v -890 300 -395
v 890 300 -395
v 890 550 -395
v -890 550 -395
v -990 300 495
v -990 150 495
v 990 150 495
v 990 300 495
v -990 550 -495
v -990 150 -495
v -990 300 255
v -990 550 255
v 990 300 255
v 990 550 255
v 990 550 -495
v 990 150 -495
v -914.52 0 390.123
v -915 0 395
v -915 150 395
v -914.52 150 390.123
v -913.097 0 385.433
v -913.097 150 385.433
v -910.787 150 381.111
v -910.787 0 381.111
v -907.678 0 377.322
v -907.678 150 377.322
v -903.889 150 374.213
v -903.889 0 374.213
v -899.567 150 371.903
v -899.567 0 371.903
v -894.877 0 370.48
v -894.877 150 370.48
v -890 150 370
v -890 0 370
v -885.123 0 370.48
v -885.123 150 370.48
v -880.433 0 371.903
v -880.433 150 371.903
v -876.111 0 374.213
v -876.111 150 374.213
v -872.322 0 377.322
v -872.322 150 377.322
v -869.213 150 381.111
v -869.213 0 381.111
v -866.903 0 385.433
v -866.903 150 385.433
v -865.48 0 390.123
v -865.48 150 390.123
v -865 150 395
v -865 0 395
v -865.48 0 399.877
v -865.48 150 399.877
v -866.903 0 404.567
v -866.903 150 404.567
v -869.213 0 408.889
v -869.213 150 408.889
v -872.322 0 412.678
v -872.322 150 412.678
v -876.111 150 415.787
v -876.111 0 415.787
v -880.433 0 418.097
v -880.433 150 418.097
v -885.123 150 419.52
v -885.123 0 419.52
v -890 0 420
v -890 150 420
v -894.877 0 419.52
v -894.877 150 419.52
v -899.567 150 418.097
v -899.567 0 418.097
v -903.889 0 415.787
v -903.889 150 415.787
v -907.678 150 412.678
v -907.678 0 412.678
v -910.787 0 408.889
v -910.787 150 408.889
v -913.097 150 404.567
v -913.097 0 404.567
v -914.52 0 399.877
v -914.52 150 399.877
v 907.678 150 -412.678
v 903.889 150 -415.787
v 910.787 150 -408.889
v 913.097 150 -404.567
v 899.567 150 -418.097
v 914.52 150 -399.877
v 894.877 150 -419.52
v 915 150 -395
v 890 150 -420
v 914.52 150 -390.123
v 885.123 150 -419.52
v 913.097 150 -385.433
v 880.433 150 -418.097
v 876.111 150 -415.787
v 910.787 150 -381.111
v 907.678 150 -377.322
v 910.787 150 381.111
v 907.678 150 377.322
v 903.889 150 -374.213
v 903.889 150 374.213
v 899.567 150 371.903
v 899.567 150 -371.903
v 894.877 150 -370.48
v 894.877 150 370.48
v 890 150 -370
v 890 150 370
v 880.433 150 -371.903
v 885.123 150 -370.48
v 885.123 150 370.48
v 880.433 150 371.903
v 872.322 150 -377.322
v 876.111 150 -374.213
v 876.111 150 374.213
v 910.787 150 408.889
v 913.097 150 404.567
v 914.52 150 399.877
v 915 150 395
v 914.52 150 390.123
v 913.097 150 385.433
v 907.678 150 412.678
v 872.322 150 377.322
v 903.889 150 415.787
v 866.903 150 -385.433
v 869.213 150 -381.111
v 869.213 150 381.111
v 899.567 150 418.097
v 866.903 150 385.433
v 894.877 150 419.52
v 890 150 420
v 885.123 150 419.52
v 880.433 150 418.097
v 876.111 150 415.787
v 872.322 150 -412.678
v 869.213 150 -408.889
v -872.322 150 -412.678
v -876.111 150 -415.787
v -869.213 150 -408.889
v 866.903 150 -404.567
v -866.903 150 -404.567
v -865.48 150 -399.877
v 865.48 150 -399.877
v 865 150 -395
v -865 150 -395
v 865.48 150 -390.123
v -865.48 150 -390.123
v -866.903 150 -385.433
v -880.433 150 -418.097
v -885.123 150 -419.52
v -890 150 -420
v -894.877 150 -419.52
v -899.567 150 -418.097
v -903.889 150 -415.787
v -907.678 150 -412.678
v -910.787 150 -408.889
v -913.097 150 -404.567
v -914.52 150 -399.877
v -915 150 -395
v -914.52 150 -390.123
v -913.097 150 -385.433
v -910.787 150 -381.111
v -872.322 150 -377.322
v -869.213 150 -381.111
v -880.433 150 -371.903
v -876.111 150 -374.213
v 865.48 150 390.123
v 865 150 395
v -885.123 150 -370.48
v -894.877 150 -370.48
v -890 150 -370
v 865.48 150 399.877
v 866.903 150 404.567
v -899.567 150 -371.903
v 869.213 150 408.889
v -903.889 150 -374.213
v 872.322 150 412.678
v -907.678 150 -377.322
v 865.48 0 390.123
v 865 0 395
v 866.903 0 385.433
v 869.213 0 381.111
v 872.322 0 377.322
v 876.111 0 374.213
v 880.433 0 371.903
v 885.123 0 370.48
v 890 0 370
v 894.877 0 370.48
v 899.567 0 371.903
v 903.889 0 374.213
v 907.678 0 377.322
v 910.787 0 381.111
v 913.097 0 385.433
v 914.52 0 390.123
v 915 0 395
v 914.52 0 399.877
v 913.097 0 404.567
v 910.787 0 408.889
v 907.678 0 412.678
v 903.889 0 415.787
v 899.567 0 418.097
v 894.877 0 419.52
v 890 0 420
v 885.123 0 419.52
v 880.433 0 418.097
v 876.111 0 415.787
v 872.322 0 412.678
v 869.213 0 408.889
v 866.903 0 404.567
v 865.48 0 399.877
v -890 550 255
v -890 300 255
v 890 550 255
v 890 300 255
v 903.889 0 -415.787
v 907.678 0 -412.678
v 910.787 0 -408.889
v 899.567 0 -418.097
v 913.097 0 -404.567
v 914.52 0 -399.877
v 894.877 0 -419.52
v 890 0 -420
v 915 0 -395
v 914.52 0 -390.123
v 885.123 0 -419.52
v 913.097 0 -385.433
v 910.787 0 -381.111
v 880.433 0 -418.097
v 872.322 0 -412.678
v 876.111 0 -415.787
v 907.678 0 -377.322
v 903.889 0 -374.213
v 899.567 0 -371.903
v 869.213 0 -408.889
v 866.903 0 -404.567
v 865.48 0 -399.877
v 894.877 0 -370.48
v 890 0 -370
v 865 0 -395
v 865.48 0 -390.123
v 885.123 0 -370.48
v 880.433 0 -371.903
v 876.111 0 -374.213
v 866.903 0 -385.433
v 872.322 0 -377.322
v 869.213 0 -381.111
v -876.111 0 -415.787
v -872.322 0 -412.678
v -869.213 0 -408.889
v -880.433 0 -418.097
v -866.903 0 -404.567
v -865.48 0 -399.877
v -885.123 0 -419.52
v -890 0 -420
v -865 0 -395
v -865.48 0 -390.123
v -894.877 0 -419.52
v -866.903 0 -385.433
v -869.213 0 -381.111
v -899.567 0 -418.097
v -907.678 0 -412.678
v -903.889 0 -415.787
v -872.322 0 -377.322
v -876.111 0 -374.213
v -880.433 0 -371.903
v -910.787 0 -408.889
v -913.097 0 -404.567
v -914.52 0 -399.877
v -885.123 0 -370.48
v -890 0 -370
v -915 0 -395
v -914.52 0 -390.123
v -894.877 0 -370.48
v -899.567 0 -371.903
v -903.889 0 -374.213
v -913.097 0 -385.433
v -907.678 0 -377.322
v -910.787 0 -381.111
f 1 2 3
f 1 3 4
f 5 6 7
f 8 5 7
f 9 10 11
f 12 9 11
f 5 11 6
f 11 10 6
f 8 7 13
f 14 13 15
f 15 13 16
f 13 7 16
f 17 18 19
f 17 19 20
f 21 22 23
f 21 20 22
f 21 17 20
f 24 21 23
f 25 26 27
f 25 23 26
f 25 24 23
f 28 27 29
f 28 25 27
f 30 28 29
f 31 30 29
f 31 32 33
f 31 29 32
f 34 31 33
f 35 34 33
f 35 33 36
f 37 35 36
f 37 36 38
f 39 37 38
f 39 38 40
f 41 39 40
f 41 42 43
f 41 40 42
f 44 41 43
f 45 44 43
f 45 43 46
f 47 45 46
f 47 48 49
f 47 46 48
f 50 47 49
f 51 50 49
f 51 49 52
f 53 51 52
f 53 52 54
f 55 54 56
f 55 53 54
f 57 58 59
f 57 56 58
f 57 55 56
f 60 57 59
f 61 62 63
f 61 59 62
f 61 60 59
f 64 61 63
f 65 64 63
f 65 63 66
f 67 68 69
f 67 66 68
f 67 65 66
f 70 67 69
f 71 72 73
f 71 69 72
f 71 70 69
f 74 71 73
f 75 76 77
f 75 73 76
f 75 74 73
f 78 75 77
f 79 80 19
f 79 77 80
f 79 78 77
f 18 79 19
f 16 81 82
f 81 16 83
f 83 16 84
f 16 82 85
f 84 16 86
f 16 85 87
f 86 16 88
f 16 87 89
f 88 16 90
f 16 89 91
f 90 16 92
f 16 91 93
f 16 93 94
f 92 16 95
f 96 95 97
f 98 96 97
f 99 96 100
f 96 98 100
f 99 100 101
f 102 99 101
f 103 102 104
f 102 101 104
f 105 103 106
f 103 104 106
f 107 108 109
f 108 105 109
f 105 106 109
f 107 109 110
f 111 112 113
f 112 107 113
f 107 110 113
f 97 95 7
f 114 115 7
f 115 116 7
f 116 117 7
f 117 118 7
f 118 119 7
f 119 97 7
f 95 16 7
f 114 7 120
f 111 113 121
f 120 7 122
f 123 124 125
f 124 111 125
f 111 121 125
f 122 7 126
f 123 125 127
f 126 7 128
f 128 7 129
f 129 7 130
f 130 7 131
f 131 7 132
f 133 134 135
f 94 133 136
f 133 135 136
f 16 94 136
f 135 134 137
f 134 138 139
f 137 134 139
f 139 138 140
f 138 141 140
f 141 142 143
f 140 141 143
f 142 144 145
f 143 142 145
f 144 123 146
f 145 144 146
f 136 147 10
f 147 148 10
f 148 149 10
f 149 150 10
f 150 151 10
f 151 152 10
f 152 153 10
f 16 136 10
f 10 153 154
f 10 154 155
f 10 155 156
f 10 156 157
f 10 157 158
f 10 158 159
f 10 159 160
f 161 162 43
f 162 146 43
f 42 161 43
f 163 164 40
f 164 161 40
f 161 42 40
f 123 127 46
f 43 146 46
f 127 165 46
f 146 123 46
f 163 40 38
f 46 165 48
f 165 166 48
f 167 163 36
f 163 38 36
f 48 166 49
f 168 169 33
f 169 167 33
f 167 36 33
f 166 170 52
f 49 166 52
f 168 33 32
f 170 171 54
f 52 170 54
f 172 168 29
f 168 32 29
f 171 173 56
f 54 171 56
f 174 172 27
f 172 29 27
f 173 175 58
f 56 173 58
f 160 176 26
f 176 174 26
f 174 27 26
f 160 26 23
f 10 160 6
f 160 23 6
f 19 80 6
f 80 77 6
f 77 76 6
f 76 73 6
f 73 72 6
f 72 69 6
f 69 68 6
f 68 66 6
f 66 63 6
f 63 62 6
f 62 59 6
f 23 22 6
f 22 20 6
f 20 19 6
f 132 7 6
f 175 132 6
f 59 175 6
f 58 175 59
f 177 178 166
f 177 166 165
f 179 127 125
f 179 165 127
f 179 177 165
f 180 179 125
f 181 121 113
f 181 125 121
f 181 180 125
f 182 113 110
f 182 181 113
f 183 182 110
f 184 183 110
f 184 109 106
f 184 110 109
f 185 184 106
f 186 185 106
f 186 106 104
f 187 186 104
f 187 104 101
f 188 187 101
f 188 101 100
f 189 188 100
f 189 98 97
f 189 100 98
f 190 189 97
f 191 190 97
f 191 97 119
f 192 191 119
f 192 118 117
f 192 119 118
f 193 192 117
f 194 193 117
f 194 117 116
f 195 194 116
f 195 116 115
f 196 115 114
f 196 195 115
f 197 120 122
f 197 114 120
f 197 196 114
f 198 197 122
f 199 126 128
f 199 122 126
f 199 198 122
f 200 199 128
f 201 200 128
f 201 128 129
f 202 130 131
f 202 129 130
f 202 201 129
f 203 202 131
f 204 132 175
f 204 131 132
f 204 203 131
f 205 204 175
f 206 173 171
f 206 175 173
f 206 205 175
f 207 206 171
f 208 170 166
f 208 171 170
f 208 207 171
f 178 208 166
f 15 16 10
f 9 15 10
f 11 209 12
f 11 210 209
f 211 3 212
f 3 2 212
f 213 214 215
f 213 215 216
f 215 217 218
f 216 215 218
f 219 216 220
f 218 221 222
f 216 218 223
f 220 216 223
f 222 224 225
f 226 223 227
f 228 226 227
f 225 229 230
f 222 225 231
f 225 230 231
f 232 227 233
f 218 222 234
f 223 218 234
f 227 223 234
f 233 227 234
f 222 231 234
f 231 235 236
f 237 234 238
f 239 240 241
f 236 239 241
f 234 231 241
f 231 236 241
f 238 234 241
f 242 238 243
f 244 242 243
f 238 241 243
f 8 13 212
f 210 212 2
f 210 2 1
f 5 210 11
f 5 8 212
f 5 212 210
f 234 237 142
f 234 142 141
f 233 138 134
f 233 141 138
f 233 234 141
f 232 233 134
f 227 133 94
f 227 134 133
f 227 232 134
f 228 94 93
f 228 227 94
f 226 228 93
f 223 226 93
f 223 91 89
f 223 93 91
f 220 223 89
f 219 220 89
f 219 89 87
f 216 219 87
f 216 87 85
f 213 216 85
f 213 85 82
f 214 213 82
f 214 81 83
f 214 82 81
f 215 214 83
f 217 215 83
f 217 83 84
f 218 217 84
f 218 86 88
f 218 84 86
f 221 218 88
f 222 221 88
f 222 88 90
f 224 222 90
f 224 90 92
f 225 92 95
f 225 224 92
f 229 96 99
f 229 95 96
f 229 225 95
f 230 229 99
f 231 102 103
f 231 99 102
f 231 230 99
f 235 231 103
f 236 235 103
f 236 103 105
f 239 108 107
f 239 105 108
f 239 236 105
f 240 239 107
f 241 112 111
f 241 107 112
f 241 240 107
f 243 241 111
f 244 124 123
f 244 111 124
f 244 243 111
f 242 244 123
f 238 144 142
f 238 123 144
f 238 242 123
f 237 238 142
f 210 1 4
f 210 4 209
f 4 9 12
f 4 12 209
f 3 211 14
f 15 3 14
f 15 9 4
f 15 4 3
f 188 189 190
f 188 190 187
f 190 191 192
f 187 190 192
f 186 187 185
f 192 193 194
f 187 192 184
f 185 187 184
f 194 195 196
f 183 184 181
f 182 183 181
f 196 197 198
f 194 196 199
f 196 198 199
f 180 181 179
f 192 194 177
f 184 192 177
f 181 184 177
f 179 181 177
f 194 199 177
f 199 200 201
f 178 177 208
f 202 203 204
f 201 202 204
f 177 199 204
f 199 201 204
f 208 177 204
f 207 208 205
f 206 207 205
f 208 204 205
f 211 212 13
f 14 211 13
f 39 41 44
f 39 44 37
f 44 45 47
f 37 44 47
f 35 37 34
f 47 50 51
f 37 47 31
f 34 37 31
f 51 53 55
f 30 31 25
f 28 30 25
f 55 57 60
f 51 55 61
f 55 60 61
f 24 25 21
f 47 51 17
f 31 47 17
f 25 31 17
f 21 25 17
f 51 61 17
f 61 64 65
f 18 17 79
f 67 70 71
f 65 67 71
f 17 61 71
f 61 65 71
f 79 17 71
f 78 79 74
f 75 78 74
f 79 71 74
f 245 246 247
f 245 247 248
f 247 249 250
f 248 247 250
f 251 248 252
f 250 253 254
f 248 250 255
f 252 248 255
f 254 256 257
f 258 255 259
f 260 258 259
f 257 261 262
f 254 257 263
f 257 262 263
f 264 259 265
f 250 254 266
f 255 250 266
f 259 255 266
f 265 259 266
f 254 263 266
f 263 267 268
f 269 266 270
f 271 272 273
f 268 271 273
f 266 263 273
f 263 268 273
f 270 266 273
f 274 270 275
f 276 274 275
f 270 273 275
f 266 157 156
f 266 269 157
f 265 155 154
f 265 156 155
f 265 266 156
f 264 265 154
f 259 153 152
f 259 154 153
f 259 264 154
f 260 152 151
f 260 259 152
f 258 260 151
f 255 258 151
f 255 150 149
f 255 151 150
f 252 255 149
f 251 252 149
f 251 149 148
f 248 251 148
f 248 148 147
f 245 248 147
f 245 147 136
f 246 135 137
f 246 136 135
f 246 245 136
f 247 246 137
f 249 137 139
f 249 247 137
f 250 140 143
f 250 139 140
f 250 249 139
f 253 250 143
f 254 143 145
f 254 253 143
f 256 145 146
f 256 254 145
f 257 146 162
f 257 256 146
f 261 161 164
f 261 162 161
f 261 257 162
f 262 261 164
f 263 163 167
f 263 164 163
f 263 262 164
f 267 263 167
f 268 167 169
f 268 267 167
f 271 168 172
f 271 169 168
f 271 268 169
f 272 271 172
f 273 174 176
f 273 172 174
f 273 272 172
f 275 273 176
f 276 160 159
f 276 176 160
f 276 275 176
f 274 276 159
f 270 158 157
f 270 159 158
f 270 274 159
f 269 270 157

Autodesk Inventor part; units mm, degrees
ref_plane "YZ Plane" through (0, 0, 0) normal (1, 0, 0) x (0, 1, 0)
ref_plane "XZ Plane" through (0, 0, 0) normal (0, 1, 0) x (-1, 0, 0)
ref_plane "XY Plane" through (0, 0, 0) normal (0, 0, 1) x (1, 0, 0)
sketch "Sketch1" plane through (0, 0, 0) normal (0, 1, 0) x (-1, 0, 0)
  line L0 (990, 495) -> (-990, 495) construction
  line L1 (-990, 495) -> (-990, -495) construction
  line L2 (-990, -495) -> (990, -495) construction
  line L3 (990, -495) -> (990, 495) construction
  line L4 (990, 495) -> (-990, -495) construction
  line L5 (-990, 495) -> (990, -495) construction
  line L6 (890, -395) -> (-890, -395) construction
  line L7 (-890, -395) -> (-890, 395) construction
  line L8 (-890, 395) -> (890, 395) construction
  line L9 (890, 395) -> (890, -395) construction
  circle A0 centre (890, -395) radius 25
  circle A1 centre (-890, -395) radius 25
  circle A2 centre (890, 395) radius 25
  circle A3 centre (-890, 395) radius 25
  point P0 (0, 0)
  dimension "d0" = 1980
  dimension "d1" = 990
  dimension "d2" = 100
  dimension "d3" = 50
extrude "Extrusion1" add sketch "Sketch1" along normal blind 150
sketch "Sketch2" plane through (0, 150, 0) normal (0, 1, 0) x (-1, 0, 0)
  line L0 (990, -495) -> (990, 495) projected
  line L1 (-990, -495) -> (990, -495) projected
  line L2 (-990, 495) -> (-990, -495) projected
  line L3 (990, 495) -> (-990, 495) projected
  point P0 (0, 0)
extrude "Extrusion2" add sketch "Sketch2" along normal blind 150
sketch "Sketch3" plane through (0, 300, 0) normal (0, 1, 0) x (1, 0, 0)
  line L0 (-990, 495) -> (990, 495)
  line L1 (990, 495) -> (990, 395)
  line L2 (990, 395) -> (-990, 395)
  line L3 (-990, 395) -> (-990, 495)
  line L4 (990, 395) -> (890, 395)
  line L5 (890, 395) -> (890, -255)
  line L6 (890, -255) -> (990, -255)
  line L7 (990, -255) -> (990, 395)
  line L8 (-990, 395) -> (-890, 395)
  line L9 (-890, 395) -> (-890, -255)
  line L10 (-890, -255) -> (-990, -255)
  line L11 (-990, -255) -> (-990, 395)
  line L12 (990, -495) -> (990, 495) projected
  point P0 (0, 0)
  dimension "d8" = 100
  dimension "d10" = 650
extrude "Extrusion3" add sketch "Sketch3" along normal blind 250
properties part number "Divano"
